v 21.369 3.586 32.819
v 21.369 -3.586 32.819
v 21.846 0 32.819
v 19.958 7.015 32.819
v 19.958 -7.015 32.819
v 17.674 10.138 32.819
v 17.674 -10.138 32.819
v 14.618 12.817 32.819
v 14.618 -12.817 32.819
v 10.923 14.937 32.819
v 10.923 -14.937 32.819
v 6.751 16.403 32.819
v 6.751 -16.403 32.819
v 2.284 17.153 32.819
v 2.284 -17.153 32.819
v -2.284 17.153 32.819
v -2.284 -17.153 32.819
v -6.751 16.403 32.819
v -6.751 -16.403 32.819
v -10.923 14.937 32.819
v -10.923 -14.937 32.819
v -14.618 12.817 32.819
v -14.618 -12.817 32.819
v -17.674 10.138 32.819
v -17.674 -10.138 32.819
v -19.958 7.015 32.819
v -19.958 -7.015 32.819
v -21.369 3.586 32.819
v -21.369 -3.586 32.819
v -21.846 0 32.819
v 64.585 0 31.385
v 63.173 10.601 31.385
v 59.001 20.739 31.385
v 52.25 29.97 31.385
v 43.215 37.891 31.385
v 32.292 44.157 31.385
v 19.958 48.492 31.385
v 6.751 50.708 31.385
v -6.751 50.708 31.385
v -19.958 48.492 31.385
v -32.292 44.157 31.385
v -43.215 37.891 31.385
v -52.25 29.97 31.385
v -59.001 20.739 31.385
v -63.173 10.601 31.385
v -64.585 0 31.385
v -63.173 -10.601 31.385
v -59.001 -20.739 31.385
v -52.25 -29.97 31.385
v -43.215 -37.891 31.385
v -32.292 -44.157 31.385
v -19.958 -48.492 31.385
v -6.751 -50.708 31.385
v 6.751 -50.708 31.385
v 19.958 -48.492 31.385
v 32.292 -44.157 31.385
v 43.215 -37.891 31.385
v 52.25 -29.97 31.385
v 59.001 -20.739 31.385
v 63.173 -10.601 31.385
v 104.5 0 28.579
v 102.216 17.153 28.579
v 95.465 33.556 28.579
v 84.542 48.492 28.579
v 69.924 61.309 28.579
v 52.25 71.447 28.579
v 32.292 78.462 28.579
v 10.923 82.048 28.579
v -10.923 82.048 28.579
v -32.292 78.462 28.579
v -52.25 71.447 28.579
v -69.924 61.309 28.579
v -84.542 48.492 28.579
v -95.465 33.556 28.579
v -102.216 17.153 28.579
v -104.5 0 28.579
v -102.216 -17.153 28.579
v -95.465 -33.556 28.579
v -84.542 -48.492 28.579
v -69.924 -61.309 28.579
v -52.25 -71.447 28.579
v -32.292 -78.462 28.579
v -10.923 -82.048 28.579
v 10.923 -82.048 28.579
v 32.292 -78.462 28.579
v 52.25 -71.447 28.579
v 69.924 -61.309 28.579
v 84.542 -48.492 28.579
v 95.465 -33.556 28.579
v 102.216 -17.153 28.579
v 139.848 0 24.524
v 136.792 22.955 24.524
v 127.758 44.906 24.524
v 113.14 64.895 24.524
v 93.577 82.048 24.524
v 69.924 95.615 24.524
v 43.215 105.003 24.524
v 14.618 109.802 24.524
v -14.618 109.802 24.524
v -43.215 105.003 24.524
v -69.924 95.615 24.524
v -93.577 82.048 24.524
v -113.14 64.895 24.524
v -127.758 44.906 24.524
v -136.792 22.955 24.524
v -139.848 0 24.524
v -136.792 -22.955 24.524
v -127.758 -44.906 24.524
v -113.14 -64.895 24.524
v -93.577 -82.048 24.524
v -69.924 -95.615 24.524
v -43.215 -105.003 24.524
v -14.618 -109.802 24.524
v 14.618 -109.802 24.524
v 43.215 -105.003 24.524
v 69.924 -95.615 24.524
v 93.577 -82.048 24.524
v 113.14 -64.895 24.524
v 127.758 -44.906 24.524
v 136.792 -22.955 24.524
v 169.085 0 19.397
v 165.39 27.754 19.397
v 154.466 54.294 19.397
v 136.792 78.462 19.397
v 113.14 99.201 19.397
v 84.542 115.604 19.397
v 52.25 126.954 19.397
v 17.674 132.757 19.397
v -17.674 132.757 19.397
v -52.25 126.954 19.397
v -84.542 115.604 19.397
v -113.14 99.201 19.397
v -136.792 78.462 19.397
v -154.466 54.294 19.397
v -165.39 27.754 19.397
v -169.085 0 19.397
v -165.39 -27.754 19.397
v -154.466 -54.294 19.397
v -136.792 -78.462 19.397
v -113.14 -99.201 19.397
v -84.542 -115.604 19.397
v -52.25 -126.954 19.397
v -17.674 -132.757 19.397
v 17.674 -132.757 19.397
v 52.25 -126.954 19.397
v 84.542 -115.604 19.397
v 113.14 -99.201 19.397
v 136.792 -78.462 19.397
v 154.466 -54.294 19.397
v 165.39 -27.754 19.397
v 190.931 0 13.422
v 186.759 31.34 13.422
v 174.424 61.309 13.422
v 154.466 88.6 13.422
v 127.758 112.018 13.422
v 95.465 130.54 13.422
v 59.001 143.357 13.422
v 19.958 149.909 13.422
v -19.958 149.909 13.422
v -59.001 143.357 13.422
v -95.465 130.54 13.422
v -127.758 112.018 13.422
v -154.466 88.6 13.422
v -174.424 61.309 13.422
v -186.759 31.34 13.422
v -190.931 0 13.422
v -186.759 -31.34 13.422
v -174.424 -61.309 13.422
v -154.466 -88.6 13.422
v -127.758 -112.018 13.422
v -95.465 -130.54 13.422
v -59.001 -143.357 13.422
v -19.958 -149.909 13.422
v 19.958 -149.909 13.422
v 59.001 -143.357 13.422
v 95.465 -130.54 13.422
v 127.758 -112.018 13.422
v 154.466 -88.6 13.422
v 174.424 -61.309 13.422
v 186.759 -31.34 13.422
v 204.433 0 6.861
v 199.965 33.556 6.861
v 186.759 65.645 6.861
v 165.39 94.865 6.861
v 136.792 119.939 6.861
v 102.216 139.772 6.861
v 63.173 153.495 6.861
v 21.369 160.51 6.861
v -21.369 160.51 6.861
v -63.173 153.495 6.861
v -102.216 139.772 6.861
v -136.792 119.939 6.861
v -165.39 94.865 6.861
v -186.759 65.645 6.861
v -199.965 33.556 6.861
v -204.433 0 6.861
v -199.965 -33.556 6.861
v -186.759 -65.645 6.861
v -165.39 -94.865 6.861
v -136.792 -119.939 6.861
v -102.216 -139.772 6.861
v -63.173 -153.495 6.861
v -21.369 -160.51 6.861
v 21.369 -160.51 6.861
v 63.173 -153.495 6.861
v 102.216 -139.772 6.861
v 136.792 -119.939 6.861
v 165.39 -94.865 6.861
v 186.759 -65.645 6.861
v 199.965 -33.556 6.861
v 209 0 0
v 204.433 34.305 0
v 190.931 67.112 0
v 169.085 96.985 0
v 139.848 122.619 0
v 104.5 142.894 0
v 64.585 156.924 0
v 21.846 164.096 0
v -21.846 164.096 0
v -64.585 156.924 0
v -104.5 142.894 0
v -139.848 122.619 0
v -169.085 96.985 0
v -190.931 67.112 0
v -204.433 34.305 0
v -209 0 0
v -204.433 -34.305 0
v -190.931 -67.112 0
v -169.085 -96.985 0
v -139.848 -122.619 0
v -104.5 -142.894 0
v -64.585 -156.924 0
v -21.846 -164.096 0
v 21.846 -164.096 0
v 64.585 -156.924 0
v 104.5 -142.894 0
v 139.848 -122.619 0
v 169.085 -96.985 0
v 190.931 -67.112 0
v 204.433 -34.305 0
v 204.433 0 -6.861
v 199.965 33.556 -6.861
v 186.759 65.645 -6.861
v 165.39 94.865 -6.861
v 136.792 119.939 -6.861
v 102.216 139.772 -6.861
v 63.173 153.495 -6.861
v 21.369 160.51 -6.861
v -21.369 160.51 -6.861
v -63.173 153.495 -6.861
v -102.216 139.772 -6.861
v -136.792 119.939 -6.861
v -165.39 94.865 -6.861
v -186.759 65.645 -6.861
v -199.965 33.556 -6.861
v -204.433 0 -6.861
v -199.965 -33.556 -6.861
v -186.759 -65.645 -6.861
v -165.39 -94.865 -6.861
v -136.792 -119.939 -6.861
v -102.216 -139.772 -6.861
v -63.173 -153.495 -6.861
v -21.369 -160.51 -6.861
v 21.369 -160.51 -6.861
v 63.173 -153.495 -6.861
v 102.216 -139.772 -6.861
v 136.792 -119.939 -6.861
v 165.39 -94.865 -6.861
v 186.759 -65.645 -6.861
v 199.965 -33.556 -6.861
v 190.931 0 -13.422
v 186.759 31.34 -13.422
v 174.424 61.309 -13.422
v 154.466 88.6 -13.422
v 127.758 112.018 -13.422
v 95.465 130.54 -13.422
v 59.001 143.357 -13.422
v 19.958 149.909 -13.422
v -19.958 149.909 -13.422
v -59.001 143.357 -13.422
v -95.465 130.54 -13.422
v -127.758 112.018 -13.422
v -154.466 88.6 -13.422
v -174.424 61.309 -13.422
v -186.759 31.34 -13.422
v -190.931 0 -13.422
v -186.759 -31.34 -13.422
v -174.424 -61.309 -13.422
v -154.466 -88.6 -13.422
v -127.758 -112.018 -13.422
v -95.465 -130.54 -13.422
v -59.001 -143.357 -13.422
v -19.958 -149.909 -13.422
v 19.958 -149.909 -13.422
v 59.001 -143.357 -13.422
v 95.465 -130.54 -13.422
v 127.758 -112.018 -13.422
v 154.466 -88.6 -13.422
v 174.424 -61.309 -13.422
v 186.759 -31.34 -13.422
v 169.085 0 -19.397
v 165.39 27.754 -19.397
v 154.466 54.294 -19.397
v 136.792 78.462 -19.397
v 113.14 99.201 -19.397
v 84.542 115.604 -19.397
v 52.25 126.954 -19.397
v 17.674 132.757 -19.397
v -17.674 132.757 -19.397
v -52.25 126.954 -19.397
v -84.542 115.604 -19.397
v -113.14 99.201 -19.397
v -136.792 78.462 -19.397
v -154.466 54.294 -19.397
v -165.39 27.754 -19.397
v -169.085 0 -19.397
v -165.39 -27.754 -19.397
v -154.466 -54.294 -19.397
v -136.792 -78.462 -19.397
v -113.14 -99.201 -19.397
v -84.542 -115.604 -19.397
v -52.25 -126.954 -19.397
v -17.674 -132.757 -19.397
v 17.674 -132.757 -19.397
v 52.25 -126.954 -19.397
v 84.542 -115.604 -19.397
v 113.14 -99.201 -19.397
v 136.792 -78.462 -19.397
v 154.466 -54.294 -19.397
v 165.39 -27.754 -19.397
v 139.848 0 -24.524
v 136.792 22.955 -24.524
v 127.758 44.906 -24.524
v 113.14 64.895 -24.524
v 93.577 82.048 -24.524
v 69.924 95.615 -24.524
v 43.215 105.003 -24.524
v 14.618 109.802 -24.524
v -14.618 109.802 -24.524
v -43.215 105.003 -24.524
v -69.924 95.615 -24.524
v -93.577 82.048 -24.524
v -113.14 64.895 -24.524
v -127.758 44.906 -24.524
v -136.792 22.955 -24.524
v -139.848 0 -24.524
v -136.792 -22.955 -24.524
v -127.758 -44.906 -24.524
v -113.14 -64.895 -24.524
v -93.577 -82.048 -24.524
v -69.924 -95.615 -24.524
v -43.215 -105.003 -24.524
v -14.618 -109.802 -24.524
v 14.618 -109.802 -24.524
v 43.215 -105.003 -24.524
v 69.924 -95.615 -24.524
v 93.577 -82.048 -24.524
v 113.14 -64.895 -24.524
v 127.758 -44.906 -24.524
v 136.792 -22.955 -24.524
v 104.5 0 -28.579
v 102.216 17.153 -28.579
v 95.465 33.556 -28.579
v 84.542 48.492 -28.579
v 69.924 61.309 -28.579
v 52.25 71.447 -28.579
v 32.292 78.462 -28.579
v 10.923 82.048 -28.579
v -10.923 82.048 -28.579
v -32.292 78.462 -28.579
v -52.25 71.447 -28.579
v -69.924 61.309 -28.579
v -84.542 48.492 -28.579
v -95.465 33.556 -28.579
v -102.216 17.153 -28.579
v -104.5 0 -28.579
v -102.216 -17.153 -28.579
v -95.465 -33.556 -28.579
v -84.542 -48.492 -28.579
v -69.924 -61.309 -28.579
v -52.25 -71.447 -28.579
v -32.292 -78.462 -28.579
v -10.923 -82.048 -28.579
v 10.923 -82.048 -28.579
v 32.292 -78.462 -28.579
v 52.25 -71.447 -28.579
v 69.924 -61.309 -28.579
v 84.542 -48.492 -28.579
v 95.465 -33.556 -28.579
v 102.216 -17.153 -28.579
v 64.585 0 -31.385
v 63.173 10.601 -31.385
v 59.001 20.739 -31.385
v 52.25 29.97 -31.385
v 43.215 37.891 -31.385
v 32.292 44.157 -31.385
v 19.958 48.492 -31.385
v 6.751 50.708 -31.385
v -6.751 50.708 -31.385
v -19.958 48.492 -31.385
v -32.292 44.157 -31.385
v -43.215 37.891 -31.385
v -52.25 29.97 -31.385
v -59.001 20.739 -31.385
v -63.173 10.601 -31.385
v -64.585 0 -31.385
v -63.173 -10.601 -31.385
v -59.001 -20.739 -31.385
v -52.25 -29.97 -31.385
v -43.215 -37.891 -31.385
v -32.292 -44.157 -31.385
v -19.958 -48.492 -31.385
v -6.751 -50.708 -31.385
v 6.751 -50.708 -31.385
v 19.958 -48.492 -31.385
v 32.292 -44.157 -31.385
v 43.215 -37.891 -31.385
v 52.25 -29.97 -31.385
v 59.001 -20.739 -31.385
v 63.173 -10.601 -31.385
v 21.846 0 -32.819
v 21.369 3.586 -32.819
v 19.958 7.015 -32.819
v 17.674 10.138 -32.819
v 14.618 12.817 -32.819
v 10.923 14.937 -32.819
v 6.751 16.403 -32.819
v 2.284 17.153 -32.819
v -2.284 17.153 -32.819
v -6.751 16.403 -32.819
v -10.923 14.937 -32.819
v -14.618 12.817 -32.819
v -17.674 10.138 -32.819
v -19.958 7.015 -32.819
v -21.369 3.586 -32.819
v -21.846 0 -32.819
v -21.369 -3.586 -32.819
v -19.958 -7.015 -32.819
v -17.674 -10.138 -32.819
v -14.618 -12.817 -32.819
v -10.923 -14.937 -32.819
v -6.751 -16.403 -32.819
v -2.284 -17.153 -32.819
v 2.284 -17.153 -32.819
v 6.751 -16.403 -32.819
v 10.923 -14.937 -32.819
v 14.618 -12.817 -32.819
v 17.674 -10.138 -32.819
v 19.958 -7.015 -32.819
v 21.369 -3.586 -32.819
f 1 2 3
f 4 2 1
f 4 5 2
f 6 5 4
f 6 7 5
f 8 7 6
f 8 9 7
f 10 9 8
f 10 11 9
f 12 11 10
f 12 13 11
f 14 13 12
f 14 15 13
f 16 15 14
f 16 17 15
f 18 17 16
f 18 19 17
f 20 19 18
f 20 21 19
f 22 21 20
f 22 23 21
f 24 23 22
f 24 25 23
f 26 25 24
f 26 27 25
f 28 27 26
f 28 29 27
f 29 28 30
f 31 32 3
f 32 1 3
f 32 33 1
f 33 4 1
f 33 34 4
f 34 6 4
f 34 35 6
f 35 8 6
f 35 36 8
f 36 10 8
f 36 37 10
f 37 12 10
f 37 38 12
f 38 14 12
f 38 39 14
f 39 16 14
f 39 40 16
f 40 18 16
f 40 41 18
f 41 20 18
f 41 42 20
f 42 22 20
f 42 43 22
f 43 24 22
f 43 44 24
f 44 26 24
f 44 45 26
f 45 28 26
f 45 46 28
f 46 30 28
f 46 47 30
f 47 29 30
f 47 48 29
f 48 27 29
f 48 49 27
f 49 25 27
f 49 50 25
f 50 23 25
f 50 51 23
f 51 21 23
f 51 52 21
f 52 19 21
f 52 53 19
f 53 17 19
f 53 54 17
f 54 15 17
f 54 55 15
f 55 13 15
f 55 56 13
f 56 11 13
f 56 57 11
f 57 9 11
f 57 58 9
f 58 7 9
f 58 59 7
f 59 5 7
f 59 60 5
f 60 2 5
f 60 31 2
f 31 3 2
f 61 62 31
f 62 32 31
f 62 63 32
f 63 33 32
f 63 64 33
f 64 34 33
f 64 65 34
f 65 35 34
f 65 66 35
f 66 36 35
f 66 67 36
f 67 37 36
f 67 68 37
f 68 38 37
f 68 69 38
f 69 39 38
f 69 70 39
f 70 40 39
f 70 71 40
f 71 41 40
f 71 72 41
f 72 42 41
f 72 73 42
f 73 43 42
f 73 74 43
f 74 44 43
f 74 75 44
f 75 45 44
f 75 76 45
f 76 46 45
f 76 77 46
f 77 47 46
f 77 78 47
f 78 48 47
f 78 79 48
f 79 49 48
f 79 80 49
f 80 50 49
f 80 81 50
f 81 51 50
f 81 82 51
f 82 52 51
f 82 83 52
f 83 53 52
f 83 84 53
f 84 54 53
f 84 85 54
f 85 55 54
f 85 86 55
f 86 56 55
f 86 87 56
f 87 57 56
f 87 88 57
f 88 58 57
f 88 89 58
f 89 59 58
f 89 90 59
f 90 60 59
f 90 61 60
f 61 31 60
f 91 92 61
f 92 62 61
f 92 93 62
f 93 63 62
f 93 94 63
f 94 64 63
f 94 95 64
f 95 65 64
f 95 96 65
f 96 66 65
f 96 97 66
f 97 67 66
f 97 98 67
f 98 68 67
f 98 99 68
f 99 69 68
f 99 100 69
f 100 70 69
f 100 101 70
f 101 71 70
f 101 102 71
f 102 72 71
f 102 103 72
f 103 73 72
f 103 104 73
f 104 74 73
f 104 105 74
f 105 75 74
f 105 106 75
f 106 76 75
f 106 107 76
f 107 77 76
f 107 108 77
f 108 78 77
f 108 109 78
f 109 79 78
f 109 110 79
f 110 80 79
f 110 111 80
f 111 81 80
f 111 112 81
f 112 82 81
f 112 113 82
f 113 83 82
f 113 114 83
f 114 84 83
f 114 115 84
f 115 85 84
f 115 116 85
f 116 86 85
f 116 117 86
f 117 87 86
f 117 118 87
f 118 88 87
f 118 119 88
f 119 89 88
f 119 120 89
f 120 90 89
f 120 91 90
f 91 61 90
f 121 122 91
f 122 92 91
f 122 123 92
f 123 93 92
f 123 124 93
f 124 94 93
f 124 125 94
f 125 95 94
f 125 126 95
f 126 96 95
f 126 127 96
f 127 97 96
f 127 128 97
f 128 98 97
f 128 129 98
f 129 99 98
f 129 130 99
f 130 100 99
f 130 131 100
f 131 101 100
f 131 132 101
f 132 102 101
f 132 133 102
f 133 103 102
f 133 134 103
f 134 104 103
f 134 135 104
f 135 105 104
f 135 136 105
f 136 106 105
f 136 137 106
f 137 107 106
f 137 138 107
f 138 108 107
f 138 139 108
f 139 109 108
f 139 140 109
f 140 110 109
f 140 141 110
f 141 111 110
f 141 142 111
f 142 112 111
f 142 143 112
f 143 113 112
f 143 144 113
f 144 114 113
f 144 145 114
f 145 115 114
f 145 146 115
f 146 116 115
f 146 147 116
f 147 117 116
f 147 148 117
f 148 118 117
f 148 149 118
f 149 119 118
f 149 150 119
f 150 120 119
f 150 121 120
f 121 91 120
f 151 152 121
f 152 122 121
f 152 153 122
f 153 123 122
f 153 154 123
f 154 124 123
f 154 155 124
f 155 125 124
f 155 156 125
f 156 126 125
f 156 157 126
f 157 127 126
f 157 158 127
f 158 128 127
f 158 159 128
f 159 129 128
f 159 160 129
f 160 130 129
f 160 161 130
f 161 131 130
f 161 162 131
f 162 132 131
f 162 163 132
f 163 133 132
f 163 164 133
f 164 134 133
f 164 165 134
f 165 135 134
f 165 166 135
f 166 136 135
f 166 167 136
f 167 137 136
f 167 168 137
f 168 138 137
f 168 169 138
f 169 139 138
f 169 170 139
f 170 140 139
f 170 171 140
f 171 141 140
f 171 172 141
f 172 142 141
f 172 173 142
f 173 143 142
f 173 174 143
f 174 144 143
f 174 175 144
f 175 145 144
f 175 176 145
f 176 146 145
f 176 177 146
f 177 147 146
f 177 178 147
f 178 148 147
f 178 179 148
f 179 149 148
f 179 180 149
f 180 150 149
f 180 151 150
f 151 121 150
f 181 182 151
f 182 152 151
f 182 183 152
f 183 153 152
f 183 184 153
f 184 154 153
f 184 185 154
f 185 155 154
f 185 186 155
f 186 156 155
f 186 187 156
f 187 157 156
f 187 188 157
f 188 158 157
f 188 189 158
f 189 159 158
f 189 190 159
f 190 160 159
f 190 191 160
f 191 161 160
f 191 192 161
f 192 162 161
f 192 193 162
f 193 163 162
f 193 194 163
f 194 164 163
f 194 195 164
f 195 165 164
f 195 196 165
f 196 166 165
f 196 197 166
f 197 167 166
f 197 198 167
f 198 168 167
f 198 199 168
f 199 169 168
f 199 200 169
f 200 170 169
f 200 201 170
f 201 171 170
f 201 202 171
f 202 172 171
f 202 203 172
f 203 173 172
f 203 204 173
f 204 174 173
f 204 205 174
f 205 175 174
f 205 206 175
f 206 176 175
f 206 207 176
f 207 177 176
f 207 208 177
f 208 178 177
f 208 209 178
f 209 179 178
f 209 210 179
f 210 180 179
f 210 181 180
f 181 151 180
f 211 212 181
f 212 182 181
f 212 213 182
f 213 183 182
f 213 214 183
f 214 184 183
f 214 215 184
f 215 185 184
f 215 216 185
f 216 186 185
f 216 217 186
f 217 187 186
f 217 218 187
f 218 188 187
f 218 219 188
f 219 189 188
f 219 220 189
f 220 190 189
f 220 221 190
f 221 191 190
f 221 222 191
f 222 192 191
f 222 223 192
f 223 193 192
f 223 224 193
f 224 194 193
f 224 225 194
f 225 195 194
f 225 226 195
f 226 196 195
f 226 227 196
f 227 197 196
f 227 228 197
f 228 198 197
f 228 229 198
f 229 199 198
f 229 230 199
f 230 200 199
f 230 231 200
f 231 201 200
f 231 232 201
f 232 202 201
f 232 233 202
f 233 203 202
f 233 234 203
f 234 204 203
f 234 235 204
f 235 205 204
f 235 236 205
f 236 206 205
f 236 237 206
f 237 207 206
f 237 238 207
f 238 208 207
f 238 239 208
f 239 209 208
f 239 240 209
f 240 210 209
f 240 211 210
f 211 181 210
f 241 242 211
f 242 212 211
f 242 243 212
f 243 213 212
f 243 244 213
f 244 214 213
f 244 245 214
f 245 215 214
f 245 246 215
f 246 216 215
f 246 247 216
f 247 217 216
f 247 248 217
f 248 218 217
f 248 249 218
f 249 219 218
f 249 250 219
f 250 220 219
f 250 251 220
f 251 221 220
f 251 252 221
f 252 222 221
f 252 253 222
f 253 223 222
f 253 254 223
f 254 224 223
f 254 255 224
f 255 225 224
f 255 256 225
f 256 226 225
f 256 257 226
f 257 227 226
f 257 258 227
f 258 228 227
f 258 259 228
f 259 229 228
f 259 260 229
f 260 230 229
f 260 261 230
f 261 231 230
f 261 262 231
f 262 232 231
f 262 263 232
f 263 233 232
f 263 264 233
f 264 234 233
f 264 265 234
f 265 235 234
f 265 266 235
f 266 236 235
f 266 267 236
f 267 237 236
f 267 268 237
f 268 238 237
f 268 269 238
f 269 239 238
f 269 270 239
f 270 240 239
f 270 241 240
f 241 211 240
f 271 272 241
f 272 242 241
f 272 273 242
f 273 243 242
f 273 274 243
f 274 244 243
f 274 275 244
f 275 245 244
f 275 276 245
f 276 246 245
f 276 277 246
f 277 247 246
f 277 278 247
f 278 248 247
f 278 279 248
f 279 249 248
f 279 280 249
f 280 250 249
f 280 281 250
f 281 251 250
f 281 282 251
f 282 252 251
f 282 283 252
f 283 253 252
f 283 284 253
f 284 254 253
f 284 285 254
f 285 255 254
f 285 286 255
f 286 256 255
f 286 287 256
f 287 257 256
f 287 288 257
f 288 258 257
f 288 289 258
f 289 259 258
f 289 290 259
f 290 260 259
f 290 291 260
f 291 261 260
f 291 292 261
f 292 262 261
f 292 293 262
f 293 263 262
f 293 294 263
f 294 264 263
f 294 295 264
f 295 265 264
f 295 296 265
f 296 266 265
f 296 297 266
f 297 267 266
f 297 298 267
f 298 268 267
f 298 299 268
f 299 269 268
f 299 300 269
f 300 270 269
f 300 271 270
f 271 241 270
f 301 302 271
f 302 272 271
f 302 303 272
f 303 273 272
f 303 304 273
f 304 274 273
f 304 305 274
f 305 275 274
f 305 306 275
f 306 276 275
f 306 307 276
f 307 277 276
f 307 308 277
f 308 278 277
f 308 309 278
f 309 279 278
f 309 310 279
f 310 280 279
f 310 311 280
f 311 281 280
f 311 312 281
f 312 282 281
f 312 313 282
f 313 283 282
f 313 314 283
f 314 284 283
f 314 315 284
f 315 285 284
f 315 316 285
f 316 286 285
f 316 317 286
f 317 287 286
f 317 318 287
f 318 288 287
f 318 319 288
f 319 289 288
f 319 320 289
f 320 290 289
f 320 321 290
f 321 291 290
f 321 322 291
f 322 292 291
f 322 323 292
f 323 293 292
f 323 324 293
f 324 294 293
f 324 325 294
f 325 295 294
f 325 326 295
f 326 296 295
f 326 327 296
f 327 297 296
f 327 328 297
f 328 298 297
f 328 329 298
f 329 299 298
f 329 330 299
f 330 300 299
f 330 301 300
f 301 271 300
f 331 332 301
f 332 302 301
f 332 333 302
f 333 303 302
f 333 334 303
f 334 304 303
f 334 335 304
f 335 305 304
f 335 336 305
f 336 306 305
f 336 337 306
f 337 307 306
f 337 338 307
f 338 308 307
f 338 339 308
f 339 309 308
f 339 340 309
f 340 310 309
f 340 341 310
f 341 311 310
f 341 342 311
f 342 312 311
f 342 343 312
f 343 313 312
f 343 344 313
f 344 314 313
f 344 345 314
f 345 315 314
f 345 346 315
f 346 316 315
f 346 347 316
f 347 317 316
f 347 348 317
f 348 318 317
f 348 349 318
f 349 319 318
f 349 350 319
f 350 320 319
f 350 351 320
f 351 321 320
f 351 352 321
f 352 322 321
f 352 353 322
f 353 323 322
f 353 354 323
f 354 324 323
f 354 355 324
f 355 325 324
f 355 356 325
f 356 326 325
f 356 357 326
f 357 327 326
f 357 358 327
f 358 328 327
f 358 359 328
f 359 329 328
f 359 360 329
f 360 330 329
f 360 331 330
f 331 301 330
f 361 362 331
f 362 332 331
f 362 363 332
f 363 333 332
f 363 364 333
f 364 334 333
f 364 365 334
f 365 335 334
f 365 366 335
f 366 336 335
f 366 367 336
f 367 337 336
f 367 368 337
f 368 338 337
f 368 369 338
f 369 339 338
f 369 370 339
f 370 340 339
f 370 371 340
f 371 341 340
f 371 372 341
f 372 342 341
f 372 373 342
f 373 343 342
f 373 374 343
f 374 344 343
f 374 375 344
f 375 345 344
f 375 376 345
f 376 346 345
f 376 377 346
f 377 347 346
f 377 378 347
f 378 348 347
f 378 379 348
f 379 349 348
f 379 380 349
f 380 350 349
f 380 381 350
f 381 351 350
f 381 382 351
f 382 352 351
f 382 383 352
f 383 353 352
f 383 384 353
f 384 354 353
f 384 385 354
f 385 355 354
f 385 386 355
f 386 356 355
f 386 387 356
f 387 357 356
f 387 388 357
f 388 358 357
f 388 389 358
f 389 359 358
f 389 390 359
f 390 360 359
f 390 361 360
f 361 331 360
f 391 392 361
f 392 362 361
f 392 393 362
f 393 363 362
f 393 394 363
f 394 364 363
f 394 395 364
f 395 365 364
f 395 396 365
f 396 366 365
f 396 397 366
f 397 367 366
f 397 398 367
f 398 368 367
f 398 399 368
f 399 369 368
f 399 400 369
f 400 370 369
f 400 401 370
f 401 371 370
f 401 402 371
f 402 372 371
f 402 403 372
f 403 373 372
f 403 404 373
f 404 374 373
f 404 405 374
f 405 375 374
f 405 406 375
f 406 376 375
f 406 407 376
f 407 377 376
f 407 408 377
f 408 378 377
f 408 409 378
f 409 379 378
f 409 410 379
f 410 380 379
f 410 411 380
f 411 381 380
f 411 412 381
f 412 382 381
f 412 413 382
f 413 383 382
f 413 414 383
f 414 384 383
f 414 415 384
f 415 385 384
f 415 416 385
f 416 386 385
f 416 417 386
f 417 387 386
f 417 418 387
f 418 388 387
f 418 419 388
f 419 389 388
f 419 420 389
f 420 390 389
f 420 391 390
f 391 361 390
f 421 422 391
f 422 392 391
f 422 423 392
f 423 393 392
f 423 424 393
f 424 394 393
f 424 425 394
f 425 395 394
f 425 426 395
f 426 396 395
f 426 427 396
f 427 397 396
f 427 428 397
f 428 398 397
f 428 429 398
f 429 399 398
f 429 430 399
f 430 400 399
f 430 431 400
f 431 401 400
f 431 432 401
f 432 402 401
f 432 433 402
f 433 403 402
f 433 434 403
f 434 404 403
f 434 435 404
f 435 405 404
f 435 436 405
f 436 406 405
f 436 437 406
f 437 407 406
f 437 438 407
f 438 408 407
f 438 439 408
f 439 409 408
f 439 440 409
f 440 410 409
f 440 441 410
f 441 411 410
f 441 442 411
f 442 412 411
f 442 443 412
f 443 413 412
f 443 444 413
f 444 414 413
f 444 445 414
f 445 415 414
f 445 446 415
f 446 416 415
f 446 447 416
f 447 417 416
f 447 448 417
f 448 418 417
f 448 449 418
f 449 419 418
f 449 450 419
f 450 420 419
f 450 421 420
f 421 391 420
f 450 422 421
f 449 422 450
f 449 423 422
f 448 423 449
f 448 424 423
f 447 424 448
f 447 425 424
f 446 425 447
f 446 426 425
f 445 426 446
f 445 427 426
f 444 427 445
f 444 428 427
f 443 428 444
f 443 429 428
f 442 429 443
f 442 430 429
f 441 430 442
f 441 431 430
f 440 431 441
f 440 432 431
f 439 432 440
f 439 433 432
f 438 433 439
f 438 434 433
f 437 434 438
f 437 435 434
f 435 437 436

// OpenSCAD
// Generated by SolidPython 1.0.1 on 2020-07-29 00:46:54


scale(v = [19, 15, 3]) {
	sphere(r = 11);
}
/***********************************************
*********      SolidPython code:      **********
************************************************
 
# import packages: SolidPython
from solid import *
from solid.utils import *
from itertools import chain, combinations, permutations


class Resize:

    def __init__(self, scad_file):
        self.scad_file = scad_file
        #self.scad_file = import_scad(scad_file)
        # cone/cylinder param:
        self.r1 = 0
        self.r2 = 0
        self.h = 0
        # rectangular prism param:
        self.w = 0
        self.l = 0
        # ellipse param:
        self.r = 0

    # import OpenScad code (file name corresponds to shape)


    # classify shape + parameters
    def assign(self, param1, param2, param3):
        if self.scad_file == 'cone.scad':
            self.r1 = param1
            self.r2 = param2
            self.h = param3
        elif self.scad_file == 'cylinder.scad':
            self.r1 = param1
            self.r2 = param2
            self.h = param3
        elif self.scad_file == 'rectangularPrism.scad':
            self.h = param1
            self.l = param2
            self.w = param3
        else:
            self.r = param1
            self.h = param2

    # resize parameters
    def iterate(self):
        x = range(3, 20, 2)
        i = 1
        if self.scad_file == 'cone.scad':
            tempList = list(permutations(x, 2))
            for temp in tempList:
                param1 = temp[0]
                param2 = temp[1]
                filepath = 'produced_scad_files/' + 'cone' + str(param1) + '_' + str(param2) + '_' + '.scad'
                scad_render_to_file(cylinder(h=param1, r1=param2, r2=0), filepath)

        elif self.scad_file == 'cylinder.scad':
            tempList = list(permutations(x, 3))
            for temp in tempList:
                param1 = temp[0]
                param2 = temp[1]
                filepath = 'produced_scad_files/' + 'cylinder' + str(param1) + '_' + str(param2) + '_' + '.scad'
                scad_render_to_file(cylinder(h=param1, r1=param2, r2=param2), filepath)

        elif self.scad_file == 'rectangularPrism.scad':
            tempList = list(permutations(x, 3))
            for temp in tempList:
                param1 = temp[0]
                param2 = temp[1]
                param3 = temp[2]
                filepath = 'produced_scad_files/' + 'rectangularPrism' + str(param1) + '_' + str(param2) + '_' + str(
                    param3) + '.scad'
                scad_render_to_file(cube(size=(param1, param2, param3)), filepath)

        elif self.scad_file == 'ellipse.scad':
            tempList = list(permutations(x, 4))
            for temp in tempList:
                param1 = temp[0]
                param2 = temp[1]
                param3 = temp[2]
                param4 = temp[3]
                filepath = 'produced_scad_files/' + 'ellipse' + str(param1) + '_' + str(param2) + '_' + str(param3) + '_' + str(param4) + '.scad'
                scad_render_to_file(scale([param1, param2, param3])(sphere(r=param4)), filepath)

    def render_to_scadfile(self):
        scad_render_to_file(scad, 'example.scad') 
 
************************************************/
